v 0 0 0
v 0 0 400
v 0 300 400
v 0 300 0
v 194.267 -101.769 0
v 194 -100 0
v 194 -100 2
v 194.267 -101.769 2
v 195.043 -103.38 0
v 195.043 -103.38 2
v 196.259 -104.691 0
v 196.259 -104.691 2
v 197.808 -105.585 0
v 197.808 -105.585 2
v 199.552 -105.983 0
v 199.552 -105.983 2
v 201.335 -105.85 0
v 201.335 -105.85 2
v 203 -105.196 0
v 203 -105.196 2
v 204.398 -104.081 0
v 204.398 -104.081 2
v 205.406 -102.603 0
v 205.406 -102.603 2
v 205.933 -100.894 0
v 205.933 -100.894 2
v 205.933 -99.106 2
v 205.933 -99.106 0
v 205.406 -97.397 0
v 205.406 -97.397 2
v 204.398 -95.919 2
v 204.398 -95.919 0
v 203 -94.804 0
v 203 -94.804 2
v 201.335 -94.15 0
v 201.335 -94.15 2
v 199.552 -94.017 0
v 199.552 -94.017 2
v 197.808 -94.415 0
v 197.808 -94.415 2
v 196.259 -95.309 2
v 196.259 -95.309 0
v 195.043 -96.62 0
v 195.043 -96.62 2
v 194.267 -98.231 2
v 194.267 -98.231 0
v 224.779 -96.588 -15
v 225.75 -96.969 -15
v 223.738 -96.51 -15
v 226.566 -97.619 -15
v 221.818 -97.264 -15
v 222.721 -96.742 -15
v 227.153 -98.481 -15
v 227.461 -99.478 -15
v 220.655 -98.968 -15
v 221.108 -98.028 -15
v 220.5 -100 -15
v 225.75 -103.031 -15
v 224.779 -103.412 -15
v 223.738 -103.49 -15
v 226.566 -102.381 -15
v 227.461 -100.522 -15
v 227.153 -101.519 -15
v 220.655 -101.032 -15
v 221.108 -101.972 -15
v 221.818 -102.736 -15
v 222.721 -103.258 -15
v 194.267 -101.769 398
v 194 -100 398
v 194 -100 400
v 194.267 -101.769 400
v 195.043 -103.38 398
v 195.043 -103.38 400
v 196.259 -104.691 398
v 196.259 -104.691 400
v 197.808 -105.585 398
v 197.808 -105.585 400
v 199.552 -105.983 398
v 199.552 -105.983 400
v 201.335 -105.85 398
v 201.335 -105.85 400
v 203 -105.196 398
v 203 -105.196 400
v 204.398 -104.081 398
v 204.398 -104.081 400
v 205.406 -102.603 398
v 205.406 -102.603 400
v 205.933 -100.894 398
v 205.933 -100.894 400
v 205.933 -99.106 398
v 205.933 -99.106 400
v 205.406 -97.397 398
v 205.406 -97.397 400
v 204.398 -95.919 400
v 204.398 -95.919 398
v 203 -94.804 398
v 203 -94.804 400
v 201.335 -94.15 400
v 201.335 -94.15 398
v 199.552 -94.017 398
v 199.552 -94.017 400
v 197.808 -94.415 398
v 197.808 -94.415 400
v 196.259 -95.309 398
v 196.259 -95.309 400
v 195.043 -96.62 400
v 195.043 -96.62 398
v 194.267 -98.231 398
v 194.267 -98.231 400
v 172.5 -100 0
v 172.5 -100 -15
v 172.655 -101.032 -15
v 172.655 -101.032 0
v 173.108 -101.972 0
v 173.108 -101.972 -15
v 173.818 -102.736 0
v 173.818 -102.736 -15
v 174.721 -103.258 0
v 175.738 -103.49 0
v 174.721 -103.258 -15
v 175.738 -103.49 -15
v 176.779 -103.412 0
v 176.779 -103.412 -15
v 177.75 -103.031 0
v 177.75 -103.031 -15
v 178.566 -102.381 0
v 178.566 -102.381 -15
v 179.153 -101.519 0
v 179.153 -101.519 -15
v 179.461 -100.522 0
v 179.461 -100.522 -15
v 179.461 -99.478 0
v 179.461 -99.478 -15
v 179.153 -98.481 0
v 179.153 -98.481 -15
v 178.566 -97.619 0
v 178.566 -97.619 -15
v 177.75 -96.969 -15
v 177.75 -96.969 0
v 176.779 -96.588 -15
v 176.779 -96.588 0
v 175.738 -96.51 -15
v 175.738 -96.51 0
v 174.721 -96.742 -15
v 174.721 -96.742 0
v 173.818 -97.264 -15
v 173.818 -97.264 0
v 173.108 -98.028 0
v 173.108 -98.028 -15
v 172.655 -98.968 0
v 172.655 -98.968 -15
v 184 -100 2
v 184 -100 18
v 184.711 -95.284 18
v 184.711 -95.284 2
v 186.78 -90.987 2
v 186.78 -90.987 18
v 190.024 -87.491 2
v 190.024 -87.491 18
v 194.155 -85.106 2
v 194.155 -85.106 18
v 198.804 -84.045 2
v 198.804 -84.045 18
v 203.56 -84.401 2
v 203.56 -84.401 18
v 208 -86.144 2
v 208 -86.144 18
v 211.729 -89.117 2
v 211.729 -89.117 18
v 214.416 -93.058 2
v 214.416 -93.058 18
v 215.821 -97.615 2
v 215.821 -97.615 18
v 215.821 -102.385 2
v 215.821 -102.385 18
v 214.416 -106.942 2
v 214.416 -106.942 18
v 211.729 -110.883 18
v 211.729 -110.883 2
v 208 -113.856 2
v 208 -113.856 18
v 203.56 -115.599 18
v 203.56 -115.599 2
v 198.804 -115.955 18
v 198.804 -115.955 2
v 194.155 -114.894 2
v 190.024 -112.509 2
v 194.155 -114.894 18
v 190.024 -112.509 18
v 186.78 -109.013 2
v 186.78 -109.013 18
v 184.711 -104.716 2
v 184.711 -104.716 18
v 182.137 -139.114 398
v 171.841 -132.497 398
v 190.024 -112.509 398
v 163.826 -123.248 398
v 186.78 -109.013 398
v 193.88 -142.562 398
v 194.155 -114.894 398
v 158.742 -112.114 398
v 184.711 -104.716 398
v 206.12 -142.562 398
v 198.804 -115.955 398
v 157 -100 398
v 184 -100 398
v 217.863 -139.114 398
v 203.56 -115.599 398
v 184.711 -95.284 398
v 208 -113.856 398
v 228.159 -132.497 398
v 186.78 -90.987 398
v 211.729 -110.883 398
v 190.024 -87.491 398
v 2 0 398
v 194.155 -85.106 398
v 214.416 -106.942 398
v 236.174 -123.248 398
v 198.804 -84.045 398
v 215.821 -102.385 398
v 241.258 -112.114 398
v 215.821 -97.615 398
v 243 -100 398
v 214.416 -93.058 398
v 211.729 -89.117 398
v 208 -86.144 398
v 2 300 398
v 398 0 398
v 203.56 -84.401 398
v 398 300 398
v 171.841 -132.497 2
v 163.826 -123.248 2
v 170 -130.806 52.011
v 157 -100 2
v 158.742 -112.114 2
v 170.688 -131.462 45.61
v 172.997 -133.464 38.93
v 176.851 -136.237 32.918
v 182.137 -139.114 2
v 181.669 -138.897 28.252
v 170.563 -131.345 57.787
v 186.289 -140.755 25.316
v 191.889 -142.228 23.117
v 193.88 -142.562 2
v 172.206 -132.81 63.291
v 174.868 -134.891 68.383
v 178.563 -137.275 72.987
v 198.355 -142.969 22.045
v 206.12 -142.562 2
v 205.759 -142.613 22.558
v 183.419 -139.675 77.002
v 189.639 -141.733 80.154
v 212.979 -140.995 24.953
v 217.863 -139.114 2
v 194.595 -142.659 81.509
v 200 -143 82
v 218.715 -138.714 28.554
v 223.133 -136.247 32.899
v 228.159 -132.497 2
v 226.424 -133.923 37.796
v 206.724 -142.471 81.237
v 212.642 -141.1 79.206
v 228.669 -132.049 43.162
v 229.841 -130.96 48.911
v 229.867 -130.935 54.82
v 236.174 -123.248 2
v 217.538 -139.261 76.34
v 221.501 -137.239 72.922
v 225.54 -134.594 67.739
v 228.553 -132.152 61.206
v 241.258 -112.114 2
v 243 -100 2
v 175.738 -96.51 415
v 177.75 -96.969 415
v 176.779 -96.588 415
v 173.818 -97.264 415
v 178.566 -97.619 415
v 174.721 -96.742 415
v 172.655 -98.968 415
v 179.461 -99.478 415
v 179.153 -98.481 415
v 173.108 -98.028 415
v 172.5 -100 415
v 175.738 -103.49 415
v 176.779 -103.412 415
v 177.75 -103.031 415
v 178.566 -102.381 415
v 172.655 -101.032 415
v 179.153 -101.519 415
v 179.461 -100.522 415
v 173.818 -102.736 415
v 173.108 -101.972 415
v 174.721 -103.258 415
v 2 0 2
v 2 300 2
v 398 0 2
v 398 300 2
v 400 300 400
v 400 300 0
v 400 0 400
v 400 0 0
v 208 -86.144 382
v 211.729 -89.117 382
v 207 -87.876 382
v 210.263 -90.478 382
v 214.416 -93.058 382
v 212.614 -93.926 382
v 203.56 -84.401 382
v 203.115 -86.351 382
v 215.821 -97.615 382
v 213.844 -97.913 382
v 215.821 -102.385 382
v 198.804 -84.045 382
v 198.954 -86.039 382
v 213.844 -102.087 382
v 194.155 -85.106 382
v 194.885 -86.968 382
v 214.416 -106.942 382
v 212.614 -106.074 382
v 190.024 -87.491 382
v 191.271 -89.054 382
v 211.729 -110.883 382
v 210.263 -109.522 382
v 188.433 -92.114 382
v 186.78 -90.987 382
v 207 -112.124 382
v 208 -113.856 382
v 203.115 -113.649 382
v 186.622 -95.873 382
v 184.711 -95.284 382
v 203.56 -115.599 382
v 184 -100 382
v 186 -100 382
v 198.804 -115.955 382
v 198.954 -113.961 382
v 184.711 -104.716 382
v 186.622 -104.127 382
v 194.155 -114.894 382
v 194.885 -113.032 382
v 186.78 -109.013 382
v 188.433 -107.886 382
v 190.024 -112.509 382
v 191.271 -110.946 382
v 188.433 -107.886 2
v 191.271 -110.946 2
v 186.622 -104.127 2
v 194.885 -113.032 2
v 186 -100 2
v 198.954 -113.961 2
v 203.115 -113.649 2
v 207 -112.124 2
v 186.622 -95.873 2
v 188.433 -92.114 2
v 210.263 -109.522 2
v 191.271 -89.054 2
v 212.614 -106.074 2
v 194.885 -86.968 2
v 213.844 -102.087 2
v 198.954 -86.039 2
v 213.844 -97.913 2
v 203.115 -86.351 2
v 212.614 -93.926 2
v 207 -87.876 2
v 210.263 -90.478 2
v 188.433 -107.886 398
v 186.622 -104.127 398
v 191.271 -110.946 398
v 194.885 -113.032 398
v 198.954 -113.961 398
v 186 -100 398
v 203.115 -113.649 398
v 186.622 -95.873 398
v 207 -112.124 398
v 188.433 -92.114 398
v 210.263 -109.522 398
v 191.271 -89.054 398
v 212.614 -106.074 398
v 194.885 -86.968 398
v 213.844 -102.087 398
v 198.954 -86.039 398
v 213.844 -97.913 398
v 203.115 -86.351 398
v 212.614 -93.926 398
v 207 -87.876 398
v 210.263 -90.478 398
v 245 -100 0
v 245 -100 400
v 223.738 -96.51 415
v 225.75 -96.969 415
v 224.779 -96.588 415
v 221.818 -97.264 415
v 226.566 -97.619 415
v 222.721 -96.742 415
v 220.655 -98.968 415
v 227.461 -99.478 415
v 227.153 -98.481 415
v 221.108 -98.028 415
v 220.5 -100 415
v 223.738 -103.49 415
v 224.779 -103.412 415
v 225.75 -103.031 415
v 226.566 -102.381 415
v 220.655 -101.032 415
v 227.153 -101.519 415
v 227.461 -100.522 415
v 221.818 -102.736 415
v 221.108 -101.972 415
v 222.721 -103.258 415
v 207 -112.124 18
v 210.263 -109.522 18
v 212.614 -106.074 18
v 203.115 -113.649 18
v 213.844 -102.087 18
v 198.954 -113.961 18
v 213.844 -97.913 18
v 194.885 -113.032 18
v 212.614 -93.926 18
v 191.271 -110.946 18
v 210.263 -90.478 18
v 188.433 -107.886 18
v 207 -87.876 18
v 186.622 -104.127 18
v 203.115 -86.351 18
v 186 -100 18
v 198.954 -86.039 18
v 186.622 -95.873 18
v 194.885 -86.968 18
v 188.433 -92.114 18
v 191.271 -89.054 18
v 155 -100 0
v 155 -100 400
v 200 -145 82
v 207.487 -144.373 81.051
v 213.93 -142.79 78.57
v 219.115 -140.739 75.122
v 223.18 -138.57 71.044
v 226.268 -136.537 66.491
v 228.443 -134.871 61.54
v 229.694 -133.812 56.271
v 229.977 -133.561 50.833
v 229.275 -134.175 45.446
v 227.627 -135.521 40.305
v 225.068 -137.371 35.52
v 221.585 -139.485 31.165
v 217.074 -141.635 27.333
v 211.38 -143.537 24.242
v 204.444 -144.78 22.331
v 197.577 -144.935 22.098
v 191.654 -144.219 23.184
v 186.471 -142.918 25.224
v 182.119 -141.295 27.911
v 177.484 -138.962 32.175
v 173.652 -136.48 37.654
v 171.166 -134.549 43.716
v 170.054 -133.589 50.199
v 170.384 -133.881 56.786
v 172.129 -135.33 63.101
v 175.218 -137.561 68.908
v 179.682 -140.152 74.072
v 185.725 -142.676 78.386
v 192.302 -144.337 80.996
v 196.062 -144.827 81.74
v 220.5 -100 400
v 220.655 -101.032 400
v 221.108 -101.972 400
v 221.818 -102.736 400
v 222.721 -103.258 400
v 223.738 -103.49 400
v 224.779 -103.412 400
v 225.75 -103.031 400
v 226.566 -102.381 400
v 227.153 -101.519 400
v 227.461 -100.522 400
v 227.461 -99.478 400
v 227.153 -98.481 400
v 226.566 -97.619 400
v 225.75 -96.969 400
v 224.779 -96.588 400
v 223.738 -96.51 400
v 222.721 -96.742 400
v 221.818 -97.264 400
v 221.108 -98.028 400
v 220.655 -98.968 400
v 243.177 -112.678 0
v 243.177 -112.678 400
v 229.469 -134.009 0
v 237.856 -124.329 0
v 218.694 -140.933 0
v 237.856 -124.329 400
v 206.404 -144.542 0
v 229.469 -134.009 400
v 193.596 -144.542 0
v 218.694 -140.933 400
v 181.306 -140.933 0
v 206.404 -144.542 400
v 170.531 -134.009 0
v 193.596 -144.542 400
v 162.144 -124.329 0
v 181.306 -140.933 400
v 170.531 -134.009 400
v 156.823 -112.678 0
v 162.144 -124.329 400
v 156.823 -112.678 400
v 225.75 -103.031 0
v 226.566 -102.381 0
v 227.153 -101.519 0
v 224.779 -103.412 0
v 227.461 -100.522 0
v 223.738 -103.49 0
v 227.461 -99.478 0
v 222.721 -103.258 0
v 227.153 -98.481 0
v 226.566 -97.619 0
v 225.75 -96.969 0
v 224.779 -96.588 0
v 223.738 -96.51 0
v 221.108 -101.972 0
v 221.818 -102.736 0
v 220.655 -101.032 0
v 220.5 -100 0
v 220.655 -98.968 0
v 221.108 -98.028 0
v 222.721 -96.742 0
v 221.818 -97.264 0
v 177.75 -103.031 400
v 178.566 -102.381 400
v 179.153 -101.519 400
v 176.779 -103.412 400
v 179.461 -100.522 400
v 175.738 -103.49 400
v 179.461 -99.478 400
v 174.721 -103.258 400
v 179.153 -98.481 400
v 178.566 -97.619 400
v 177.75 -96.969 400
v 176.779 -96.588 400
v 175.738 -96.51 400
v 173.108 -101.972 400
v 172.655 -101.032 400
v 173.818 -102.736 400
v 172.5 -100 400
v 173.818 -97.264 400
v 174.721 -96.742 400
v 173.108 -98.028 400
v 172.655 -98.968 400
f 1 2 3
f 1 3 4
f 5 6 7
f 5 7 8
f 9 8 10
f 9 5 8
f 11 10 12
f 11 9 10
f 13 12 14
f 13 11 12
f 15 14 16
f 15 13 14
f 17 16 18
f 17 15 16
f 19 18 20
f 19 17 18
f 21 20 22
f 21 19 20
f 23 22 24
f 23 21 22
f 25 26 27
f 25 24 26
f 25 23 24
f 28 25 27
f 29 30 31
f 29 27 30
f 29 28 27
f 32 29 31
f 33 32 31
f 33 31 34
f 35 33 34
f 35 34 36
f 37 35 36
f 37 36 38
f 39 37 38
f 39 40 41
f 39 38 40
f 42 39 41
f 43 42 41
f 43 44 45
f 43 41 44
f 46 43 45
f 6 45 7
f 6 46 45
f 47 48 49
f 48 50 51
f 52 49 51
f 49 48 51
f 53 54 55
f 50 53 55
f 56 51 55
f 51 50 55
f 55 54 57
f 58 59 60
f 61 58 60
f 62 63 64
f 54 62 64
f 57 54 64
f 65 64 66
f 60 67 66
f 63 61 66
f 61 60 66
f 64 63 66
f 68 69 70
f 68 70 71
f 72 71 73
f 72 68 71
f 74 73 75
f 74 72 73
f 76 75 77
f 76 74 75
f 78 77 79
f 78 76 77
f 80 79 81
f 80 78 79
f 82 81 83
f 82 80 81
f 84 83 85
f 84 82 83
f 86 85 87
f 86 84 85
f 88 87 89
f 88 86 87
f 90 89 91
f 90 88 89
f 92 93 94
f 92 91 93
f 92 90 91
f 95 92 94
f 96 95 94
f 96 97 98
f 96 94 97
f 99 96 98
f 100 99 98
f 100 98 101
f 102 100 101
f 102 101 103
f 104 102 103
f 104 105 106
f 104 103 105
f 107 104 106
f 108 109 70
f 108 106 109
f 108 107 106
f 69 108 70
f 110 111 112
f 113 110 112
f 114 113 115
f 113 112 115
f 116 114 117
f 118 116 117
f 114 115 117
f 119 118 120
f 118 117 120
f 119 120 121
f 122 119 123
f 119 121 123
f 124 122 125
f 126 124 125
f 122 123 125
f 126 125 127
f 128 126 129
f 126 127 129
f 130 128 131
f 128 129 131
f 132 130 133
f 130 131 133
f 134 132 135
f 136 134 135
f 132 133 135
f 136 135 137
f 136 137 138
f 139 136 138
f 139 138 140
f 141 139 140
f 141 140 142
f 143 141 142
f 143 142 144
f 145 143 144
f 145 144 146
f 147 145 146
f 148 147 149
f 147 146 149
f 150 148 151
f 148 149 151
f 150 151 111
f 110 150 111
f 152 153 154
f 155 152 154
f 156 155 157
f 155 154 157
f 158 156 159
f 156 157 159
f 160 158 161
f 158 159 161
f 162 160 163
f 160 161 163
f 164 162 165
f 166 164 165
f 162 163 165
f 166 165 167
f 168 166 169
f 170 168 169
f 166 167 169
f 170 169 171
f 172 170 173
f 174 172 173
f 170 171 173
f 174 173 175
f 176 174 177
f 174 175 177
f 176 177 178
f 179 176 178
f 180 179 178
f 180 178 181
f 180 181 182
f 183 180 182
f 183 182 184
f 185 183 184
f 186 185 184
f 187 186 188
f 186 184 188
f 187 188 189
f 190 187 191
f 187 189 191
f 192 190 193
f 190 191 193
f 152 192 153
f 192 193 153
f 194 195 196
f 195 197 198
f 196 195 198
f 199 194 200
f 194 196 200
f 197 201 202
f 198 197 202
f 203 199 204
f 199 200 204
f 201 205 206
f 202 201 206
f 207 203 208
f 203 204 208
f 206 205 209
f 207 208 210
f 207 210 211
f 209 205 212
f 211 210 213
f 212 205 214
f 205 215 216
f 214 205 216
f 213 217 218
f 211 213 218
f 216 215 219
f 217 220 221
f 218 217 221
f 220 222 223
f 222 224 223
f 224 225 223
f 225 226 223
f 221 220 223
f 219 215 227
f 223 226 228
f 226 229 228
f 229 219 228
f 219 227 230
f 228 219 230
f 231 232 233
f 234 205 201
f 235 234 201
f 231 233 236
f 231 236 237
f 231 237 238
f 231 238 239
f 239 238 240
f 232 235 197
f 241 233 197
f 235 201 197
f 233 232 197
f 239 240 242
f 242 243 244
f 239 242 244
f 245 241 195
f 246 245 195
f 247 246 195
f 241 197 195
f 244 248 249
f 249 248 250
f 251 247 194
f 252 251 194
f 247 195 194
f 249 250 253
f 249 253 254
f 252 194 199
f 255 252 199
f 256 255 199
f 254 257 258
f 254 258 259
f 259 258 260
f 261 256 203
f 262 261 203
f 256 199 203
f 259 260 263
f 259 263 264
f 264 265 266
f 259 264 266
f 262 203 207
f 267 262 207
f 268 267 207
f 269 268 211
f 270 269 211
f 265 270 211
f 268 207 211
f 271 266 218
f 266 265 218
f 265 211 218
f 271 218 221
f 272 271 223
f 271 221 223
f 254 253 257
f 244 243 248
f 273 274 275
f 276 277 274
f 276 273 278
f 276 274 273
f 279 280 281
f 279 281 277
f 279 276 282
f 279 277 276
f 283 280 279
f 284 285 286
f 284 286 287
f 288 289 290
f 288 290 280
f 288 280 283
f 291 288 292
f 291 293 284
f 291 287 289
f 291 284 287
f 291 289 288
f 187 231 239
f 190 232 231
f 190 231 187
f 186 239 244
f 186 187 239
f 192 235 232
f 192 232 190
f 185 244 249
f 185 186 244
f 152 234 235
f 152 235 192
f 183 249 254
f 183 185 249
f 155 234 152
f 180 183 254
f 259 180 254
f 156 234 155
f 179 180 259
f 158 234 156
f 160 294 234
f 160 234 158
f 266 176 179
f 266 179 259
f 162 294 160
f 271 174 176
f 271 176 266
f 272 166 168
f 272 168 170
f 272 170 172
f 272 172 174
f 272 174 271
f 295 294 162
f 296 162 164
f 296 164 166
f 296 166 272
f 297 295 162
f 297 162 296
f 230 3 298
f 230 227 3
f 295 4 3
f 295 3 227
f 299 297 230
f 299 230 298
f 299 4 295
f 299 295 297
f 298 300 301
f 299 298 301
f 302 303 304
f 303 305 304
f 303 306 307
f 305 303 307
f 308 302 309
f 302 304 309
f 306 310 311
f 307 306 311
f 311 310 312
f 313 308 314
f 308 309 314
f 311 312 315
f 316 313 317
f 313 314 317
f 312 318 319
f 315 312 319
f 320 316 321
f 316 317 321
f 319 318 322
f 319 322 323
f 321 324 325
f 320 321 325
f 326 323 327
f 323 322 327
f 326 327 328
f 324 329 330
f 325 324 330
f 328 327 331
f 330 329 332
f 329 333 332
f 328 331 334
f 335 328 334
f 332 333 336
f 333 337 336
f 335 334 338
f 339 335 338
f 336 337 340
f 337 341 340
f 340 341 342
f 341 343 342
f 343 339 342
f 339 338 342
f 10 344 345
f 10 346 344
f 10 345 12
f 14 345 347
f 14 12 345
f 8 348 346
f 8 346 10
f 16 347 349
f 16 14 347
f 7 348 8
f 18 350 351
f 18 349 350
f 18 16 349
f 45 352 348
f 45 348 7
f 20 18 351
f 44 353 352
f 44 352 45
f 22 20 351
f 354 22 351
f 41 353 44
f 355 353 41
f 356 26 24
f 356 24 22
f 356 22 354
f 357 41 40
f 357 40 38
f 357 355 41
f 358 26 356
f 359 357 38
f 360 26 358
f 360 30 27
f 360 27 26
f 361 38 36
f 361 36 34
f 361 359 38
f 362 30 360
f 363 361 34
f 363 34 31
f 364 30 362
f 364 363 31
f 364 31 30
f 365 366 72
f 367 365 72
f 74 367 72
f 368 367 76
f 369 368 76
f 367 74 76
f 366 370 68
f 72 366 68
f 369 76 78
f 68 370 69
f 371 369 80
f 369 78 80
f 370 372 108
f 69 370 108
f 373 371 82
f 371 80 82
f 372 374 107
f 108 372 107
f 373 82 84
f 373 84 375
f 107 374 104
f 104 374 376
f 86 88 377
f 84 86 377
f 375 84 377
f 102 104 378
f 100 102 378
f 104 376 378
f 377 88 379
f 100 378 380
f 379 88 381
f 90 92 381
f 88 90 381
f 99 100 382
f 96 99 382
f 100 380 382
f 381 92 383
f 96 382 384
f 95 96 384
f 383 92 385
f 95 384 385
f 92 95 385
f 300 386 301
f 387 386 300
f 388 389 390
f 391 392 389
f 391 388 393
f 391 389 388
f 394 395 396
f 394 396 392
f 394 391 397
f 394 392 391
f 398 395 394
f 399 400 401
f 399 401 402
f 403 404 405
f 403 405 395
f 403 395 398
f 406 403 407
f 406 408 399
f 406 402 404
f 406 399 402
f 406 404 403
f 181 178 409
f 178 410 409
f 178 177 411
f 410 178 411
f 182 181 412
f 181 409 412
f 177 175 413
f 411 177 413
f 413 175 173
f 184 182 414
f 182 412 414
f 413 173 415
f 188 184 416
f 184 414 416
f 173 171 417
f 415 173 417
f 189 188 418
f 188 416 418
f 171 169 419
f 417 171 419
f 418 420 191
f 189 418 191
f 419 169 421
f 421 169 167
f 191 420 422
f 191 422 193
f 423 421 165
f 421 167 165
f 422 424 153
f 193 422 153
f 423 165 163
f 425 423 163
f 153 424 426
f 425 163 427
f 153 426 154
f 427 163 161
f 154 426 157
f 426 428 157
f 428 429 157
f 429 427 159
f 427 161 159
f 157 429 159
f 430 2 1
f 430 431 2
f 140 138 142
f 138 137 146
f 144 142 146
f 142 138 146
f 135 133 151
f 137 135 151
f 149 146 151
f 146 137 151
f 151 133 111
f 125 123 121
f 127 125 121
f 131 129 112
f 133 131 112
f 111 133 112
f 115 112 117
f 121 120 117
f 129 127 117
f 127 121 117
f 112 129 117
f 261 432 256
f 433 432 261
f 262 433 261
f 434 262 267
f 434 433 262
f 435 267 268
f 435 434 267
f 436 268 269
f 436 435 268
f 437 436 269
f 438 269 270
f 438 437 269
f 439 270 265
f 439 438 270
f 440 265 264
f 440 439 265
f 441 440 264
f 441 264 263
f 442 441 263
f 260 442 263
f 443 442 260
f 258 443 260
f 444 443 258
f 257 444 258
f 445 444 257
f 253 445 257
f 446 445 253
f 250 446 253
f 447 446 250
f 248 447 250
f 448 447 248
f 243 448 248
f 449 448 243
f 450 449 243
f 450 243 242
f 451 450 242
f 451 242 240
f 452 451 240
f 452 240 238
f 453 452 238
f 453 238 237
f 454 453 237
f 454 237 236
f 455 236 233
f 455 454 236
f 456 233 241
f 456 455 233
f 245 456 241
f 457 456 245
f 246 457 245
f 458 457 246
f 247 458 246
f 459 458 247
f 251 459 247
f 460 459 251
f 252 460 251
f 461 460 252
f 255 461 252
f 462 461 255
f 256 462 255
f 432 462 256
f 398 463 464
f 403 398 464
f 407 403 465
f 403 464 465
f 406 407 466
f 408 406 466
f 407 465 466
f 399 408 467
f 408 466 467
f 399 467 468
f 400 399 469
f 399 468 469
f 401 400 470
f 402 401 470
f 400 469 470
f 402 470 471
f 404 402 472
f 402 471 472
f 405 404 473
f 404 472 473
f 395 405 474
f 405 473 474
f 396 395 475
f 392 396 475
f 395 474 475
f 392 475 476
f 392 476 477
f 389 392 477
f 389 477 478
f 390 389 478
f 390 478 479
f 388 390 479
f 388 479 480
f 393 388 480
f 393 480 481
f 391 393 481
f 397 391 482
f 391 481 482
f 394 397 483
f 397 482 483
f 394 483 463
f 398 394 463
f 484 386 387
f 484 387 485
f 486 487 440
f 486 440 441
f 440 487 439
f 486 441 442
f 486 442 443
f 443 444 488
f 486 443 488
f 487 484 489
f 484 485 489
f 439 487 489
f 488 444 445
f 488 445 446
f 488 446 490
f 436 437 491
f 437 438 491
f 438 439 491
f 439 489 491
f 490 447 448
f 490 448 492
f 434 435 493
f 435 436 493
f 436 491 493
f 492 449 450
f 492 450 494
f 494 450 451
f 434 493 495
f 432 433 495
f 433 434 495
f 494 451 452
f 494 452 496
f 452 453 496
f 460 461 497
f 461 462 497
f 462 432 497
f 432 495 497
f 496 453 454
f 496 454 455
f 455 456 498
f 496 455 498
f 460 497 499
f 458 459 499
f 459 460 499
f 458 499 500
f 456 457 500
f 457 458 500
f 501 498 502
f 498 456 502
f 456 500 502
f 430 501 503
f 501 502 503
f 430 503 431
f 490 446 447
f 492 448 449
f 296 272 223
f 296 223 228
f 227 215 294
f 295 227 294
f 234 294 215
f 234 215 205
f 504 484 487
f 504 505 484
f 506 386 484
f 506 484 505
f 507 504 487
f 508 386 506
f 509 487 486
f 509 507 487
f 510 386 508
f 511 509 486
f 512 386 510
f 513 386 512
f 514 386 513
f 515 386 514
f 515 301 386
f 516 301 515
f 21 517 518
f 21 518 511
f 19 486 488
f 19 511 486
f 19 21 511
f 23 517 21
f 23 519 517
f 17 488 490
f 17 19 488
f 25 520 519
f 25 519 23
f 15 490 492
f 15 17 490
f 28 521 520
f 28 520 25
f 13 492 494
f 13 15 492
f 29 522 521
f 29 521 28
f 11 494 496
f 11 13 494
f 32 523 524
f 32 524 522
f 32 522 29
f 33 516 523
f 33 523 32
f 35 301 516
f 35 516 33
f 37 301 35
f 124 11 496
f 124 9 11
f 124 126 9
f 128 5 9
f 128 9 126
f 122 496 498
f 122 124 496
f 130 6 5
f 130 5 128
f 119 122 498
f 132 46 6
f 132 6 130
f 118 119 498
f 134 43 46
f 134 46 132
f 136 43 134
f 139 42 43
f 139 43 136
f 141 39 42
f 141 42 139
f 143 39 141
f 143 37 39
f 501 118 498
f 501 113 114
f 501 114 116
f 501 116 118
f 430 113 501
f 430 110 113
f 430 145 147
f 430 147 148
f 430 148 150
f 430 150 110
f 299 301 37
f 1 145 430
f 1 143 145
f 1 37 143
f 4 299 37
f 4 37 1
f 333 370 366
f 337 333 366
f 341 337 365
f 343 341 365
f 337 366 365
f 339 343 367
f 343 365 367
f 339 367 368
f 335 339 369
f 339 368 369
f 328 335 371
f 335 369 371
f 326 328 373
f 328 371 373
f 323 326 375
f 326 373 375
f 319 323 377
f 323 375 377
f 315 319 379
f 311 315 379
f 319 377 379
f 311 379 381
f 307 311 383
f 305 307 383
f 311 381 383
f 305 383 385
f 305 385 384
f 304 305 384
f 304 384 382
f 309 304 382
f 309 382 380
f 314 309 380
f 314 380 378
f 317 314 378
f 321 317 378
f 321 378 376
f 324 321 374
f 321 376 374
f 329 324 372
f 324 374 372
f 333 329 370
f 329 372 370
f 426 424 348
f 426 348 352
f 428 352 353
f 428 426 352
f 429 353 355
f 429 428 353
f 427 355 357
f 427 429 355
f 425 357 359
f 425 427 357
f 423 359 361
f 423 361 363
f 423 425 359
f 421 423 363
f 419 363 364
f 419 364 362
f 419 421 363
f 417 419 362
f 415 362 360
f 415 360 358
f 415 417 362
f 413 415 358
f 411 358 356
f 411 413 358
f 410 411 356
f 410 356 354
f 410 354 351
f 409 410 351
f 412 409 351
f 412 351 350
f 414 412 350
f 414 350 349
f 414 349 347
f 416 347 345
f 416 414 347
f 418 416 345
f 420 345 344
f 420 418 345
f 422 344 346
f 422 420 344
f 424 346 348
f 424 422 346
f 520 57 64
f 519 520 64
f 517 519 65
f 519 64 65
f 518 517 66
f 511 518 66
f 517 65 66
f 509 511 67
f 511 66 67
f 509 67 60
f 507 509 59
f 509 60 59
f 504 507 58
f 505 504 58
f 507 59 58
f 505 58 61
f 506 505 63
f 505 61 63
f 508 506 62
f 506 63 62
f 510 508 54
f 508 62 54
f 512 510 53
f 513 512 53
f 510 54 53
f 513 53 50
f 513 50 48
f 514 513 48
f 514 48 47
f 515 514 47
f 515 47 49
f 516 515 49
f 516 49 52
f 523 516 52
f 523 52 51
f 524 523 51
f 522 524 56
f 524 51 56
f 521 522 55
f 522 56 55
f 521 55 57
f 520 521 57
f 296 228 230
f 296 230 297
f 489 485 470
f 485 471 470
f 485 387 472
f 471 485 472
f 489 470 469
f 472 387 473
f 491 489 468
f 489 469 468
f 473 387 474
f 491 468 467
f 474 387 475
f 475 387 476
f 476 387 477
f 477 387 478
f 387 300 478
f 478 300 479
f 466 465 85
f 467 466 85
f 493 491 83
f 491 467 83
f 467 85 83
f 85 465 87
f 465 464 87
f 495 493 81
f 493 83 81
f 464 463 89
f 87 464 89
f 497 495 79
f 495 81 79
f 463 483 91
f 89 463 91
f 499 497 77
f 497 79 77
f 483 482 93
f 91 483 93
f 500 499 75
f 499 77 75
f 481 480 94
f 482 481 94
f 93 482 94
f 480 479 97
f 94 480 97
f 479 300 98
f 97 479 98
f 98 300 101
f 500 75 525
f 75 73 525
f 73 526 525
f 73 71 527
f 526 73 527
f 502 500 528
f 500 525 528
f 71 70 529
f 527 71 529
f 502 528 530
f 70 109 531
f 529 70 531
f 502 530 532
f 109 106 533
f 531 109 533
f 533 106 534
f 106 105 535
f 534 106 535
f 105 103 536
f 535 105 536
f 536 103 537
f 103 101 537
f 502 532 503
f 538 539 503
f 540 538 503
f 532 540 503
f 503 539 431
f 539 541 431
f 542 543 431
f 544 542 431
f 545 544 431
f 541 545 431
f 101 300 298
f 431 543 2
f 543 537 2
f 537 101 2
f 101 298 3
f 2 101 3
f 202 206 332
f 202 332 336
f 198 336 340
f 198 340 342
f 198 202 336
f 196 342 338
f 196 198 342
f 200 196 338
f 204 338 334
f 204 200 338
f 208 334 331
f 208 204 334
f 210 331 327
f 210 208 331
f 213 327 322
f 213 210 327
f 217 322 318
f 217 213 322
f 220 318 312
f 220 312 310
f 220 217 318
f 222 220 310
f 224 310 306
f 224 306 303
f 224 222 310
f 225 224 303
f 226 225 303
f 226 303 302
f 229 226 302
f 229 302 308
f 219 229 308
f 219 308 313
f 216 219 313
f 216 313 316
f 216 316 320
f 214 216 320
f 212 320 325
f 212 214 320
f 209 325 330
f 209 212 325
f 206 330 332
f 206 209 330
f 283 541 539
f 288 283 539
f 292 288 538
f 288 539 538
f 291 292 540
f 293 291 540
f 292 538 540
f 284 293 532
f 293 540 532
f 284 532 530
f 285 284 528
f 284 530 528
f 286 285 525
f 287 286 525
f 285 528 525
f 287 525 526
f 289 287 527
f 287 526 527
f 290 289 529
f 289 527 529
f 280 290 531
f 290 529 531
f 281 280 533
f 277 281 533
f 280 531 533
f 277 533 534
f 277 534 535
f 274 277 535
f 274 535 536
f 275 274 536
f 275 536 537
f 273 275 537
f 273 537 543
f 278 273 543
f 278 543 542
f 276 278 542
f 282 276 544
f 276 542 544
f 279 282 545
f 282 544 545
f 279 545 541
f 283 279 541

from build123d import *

# Parameters (mm, degrees)
SKETCH1_W               = 400
SKETCH1_H               = 400
SKETCH1_W_2             = 396
SKETCH1_H_2             = 396
BOSS_EXTRUDE1_DEPTH     = 300
CUT_LOFT1_START         = 2
CUT_LOFT1_DEPTH         = 396
BOSS_EXTRUDE2_DEPTH     = 400
BOSS_EXTRUDE3_DEPTH     = 2
BOSS_EXTRUDE6_START     = -398
BOSS_EXTRUDE6_DEPTH     = 2
CUT_EXTRUDE1_DEPTH      = 641.312423915
CUT_EXTRUDE1_DEPTH_BACK = 641.312423915
SKETCH9_R               = 6
BOSS_EXTRUDE4_START     = -2
SKETCH10_R              = 16
SKETCH10_R_2            = 14
BOSS_EXTRUDE4_DEPTH     = 16
BOSS_EXTRUDE5_START     = -18
SKETCH11_R              = 16
SKETCH11_R_2            = 14
BOSS_EXTRUDE5_DEPTH     = 16
CUT_EXTRUDE2_DEPTH      = 720.739536394
CUT_EXTRUDE2_DEPTH_BACK = 720.739536394
SKETCH13_R              = 30
SKETCH14_R              = 3.5
BOSS_EXTRUDE7_DEPTH     = 15
BOSS_EXTRUDE8_START     = -415
SKETCH14_2_R            = 3.5
BOSS_EXTRUDE8_DEPTH     = 15


# Read off the part's stored shape, not the designer's step: Cut-Loft1
with BuildPart() as part:
    # Sketch1 → Boss-Extrude1 (new body)
    with BuildSketch(Plane(origin=(0, 0, 0), x_dir=(1, 0, 0), z_dir=(0, 1, 0))):
        with Locations((200, -200)):
            Rectangle(SKETCH1_W, SKETCH1_H)
        with Locations((200, -200)):
            Rectangle(SKETCH1_W_2, SKETCH1_H_2, mode=Mode.SUBTRACT)
    extrude(amount=BOSS_EXTRUDE1_DEPTH)

    # Upper_profile → Loft6 section 0
    with BuildSketch(Plane(origin=(0, 0, 0), x_dir=(1, 0, 0), z_dir=(0, 1, 0))):
        with BuildLine():
            Line((0, 0), (400, 0))
            Line((400, 0), (400, -400))
            Line((400, -400), (0, -400))
            Line((0, -400), (0, 0))
        make_face()
    # Bellow_profile → Loft6 section 1
    with BuildSketch(Plane(origin=(0, -100, 0), x_dir=(1, 0, 0), z_dir=(0, 1, 0))):
        with BuildLine():
            Line((155, 0), (245, 0))
            Line((245, 0), (245, -400))
            Line((245, -400), (155, -400))
            Line((155, -400), (155, 0))
        make_face()
    loft()

    # Cut-Loft1 outline → Cut-Loft1 (cut)
    with BuildSketch(Plane.XY.offset(CUT_LOFT1_START)):
        Polygon((157, -100), (243, -100), (398, 0), (2, 0), align=None)
    extrude(amount=CUT_LOFT1_DEPTH, mode=Mode.SUBTRACT)

    # Sketch7 → Boss-Extrude2 (add)
    with BuildSketch(Plane.XY.offset(400)):
        with BuildLine():
            Line((155, -100), (157, -100))
            ThreePointArc((157, -100), (200, -143), (243, -100))
            Line((243, -100), (245, -100))
            ThreePointArc((245, -100), (200, -145), (155, -100))
        make_face()
    extrude(amount=-BOSS_EXTRUDE2_DEPTH)

    # Sketch8 → Boss-Extrude3 (add)
    with BuildSketch(Plane.XY.offset(400)):
        with BuildLine():
            Line((245, -100), (155, -100))
            ThreePointArc((155, -100), (200, -145), (245, -100))
        make_face()
    extrude(amount=-BOSS_EXTRUDE3_DEPTH)

    # Sketch8<2> → Boss-Extrude6 (add)
    with BuildSketch(Plane.XY.offset(400).offset(BOSS_EXTRUDE6_START)):
        with BuildLine():
            Line((245, -100), (155, -100))
            ThreePointArc((155, -100), (200, -145), (245, -100))
        make_face()
    extrude(amount=-BOSS_EXTRUDE6_DEPTH)

    # Sketch9 → Cut-Extrude1 (cut, two sides: drawn at the far end of the back side and taken through both)
    with BuildSketch(Plane.XY.offset(400).offset(-CUT_EXTRUDE1_DEPTH_BACK)):
        with Locations(Location((200, -100, 0), (0, 0, 180))):
            Circle(SKETCH9_R)
    extrude(amount=CUT_EXTRUDE1_DEPTH + CUT_EXTRUDE1_DEPTH_BACK, mode=Mode.SUBTRACT)

    # Sketch10 → Boss-Extrude4 (add)
    with BuildSketch(Plane.XY.offset(400).offset(BOSS_EXTRUDE4_START)):
        with Locations(Location((200, -100, 0), (0, 0, 180))):
            Circle(SKETCH10_R)
        with Locations(Location((200, -100, 0), (0, 0, 180))):
            Circle(SKETCH10_R_2, mode=Mode.SUBTRACT)
    extrude(amount=-BOSS_EXTRUDE4_DEPTH)

    # Sketch11 → Boss-Extrude5 (add)
    with BuildSketch(Plane(origin=(0, 0, 0), x_dir=(-1, 0, 0), z_dir=(0, 0, -1)).offset(BOSS_EXTRUDE5_START)):
        with Locations((-200, -100)):
            Circle(SKETCH11_R)
        with Locations((-200, -100)):
            Circle(SKETCH11_R_2, mode=Mode.SUBTRACT)
    extrude(amount=BOSS_EXTRUDE5_DEPTH)

    # Sketch13 → Cut-Extrude2 (cut, two sides: drawn at the far end of the back side and taken through both)
    with BuildSketch(Plane(origin=(0, 300, 0), x_dir=(1, 0, 0), z_dir=(0, 1, 0)).offset(-CUT_EXTRUDE2_DEPTH_BACK)):
        with Locations(Location((200, -52, 0), (0, 0, 270))):
            Circle(SKETCH13_R)
    extrude(amount=CUT_EXTRUDE2_DEPTH + CUT_EXTRUDE2_DEPTH_BACK, mode=Mode.SUBTRACT)

    # Sketch14 → Boss-Extrude7 (add)
    with BuildSketch(Plane.XY.offset(400)):
        with Locations(Location((224, -100, 0), (0, 0, 180))):
            Circle(SKETCH14_R)
        with Locations(Location((176, -100, 0), (0, 0, 180))):
            Circle(SKETCH14_R)
    extrude(amount=BOSS_EXTRUDE7_DEPTH)

    # Sketch14<2> → Boss-Extrude8 (add)
    with BuildSketch(Plane.XY.offset(400).offset(BOSS_EXTRUDE8_START)):
        with Locations(Location((224, -100, 0), (0, 0, 180))):
            Circle(SKETCH14_2_R)
        with Locations(Location((176, -100, 0), (0, 0, 180))):
            Circle(SKETCH14_2_R)
    extrude(amount=BOSS_EXTRUDE8_DEPTH)


solid = part.part
